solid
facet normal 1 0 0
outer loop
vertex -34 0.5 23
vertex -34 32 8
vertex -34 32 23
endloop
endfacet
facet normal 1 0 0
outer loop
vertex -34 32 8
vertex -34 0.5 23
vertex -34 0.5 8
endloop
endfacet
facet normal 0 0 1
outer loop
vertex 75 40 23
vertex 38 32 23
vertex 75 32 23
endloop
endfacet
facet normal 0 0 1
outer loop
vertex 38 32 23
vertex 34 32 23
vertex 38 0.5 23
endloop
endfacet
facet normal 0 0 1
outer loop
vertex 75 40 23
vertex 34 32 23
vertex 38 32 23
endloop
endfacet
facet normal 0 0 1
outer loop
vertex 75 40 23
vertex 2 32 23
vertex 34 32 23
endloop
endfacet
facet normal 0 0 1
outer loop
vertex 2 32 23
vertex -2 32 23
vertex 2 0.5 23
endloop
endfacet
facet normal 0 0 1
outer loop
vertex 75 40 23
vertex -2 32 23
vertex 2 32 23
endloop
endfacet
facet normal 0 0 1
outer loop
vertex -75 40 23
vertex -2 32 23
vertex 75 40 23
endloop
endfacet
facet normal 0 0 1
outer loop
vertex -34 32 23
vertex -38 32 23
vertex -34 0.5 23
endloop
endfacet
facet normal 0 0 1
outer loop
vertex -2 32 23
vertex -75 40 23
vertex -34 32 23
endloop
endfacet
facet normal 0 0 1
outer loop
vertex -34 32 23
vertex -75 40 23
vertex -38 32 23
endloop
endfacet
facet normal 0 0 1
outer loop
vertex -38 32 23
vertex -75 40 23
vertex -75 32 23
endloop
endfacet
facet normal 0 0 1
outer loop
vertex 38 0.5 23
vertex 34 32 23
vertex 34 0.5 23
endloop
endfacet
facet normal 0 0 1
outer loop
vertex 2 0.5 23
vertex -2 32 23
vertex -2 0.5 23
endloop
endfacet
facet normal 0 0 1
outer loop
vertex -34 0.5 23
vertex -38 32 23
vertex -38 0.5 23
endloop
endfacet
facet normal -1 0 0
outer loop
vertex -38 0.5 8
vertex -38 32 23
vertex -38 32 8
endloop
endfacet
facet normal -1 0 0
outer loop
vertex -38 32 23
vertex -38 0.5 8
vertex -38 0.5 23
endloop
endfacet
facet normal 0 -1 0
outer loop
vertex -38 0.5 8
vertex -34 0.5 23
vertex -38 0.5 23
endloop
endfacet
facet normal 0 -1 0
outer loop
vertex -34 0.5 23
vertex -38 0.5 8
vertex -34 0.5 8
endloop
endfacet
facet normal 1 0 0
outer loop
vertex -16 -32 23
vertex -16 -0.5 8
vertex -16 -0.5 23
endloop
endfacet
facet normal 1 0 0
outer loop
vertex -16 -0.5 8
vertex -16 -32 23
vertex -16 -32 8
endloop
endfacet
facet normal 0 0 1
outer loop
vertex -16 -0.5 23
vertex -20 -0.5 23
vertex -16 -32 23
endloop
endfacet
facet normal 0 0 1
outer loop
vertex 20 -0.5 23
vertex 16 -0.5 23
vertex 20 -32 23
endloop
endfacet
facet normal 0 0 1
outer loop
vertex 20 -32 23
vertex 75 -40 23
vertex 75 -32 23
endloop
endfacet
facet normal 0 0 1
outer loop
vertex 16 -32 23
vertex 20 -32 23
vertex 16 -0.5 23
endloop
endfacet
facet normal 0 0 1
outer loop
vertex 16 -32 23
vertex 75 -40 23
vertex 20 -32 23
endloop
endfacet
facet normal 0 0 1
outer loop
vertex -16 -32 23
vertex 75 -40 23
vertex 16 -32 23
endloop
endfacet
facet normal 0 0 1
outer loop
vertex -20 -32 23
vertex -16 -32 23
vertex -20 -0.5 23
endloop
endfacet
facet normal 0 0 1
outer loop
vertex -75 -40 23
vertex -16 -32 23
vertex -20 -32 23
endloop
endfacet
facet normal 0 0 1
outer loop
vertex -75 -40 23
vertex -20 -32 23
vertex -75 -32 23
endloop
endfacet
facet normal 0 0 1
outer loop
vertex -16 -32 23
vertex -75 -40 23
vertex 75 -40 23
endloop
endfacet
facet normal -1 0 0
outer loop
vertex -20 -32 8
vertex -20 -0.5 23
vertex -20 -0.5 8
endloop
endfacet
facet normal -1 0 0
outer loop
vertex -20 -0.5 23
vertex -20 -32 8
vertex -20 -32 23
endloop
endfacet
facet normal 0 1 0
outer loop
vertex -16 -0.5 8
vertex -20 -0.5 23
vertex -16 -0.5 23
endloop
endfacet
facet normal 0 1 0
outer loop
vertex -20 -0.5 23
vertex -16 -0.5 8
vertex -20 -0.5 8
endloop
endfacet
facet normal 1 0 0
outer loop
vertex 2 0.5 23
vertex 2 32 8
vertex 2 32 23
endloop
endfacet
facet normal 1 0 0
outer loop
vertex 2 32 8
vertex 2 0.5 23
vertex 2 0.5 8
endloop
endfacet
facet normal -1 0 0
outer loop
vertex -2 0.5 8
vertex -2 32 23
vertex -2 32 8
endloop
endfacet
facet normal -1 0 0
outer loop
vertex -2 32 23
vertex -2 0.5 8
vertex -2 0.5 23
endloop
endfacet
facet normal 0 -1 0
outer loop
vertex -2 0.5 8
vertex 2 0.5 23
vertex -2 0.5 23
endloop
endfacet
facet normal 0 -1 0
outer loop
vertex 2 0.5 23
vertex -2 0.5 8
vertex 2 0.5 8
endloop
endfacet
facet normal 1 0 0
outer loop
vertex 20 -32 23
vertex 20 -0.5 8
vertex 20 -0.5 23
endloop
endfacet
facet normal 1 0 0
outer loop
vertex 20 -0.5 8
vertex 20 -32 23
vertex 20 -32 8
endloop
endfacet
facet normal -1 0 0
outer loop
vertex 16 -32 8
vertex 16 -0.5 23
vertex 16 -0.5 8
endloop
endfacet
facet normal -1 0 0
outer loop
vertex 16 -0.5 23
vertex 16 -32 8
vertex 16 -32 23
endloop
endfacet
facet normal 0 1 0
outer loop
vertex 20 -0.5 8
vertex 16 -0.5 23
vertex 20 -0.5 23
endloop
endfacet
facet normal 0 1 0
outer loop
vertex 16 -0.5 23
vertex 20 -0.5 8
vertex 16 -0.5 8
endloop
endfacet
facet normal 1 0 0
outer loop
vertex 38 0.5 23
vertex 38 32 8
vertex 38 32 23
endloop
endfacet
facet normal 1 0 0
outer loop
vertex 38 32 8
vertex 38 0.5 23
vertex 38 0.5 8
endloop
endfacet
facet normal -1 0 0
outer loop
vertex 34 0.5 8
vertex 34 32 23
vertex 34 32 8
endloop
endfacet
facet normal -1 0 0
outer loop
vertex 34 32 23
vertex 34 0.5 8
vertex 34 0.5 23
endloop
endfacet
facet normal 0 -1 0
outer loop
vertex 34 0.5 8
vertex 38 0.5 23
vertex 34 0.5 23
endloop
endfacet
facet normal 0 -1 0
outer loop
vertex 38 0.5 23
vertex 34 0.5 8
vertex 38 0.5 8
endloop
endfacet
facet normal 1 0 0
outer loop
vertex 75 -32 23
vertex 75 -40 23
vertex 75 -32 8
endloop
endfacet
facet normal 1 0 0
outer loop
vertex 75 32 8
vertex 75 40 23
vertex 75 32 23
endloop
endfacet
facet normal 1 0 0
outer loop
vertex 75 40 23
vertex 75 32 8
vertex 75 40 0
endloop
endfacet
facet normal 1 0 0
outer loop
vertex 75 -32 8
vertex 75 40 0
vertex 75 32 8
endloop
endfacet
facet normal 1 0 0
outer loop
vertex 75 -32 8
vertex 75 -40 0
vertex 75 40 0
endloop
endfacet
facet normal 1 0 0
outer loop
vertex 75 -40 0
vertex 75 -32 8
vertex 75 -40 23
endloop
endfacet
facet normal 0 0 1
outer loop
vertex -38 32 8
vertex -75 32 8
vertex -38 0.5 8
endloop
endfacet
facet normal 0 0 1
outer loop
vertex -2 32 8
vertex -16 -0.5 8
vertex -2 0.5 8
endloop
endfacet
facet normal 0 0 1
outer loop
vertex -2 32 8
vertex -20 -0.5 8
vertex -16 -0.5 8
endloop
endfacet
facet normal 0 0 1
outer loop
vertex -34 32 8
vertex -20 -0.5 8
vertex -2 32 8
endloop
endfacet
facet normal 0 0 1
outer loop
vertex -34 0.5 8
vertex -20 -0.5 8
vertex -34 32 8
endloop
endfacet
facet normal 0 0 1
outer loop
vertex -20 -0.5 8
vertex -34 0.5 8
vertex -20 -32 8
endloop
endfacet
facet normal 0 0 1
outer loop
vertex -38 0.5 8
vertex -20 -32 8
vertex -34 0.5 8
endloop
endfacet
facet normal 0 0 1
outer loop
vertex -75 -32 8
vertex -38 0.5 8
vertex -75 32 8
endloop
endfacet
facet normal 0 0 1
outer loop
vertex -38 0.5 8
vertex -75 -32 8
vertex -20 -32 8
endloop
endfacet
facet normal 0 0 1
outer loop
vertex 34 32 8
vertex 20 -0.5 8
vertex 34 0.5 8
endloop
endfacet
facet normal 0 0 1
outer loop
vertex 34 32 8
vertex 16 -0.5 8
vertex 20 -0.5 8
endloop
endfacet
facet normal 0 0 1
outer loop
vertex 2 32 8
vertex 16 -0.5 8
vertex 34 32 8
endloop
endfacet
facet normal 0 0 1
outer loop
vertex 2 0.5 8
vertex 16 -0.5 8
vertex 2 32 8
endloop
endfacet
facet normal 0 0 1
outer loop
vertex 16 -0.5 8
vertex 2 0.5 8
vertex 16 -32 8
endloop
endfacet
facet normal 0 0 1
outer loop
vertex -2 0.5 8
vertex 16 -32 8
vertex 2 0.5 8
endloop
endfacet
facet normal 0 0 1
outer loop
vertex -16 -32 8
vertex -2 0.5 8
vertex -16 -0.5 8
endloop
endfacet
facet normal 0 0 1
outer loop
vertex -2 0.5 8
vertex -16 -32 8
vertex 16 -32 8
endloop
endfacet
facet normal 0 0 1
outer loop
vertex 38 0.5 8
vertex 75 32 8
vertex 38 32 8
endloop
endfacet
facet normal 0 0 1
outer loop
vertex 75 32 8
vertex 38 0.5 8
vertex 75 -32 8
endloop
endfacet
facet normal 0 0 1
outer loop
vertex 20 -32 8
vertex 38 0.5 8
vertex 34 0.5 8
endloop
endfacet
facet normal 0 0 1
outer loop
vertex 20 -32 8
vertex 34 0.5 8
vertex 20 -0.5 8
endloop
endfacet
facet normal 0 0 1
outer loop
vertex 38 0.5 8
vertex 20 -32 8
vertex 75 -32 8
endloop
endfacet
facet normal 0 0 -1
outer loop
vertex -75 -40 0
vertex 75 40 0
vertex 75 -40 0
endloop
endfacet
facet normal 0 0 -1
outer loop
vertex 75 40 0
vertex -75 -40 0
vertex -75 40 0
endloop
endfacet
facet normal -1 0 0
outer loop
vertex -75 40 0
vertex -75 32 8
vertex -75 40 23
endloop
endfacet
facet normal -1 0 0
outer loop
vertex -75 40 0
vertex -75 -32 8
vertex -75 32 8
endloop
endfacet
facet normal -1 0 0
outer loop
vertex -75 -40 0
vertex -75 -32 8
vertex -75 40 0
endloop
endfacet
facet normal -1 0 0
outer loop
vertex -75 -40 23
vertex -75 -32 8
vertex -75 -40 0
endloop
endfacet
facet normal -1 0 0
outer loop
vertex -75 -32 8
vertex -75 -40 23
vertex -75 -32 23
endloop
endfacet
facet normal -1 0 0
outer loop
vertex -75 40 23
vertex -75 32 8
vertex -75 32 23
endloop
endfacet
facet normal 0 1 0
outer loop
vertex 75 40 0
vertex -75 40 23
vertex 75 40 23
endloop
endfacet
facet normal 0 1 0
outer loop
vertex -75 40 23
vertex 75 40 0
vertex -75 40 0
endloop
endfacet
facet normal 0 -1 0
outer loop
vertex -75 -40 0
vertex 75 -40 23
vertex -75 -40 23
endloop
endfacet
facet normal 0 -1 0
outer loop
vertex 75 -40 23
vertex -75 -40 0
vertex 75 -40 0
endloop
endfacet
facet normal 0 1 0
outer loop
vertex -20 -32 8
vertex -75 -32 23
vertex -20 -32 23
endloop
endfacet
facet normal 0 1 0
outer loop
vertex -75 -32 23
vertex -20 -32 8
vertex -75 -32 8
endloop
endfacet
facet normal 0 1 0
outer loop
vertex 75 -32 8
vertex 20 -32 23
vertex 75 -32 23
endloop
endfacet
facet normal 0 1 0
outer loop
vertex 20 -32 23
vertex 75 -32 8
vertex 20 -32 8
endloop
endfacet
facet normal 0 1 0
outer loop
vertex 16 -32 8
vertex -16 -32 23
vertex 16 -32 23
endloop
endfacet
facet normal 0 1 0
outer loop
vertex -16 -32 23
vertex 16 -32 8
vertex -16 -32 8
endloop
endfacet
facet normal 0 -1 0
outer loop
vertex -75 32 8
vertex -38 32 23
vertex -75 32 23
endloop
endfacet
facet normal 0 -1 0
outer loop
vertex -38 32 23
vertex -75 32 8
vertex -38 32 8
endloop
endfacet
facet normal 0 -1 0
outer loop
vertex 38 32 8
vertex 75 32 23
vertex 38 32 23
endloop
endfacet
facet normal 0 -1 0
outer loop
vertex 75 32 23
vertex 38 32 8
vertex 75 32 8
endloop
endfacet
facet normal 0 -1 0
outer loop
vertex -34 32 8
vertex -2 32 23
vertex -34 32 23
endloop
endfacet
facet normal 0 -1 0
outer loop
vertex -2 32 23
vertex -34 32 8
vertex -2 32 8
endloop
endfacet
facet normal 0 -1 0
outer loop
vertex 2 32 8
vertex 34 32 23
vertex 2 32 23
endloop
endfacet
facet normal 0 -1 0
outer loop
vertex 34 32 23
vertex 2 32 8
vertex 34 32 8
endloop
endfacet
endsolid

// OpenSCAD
$fn = 32;

// ----------------------------------------------------------------------
// Rib frame 150 x 80 x 23
// 5 ribs at 18 mm pitch, staggered
// ----------------------------------------------------------------------

// --- parameters (mm) ---
frame = [150, 80, 8];  // base plate size (x, y, z)
rail_w = 8;            // side rail width
ribs = 5;              // number of ribs
rib_t = 4;             // rib thickness
rib_h = 15;            // rib height above the base plate
pitch = 18;            // pitch between rib centres

// --- derived feature positions (mm) ---
span = (ribs - 1) * pitch;          // = 72   distance between the outer ribs
origin_x = -span / 2;               // = -36   X of the first rib
rib_len = frame[1] / 2 - rail_w + 0.5;  // = 32.5   length of a staggered rib
rib_y = 0.5 + rib_len / 2;          // = 16.75   Y of a staggered rib centre
row_offset = 2 * rib_y;             // = 33.5   distance between the two rows
feature_centers = [
  [origin_x + 0 * pitch, rib_y],
  [origin_x + 1 * pitch, -rib_y],
  [origin_x + 2 * pitch, rib_y],
  [origin_x + 3 * pitch, -rib_y],
  [origin_x + 4 * pitch, rib_y]
];   // rib centre line, drives the rib loop

// base plate, two side rails, then the ribs read straight off feature_centers
union() {
  translate([-frame[0] / 2, -frame[1] / 2, 0]) cube(frame);
  translate([-frame[0] / 2, -frame[1] / 2, 0]) cube([frame[0], rail_w, frame[2] + rib_h]);
  translate([-frame[0] / 2, frame[1] / 2 - rail_w, 0]) cube([frame[0], rail_w, frame[2] + rib_h]);
  for (centre = feature_centers)
    translate([centre[0] - rib_t / 2, centre[1] - rib_len / 2, frame[2] - 1])
      cube([rib_t, rib_len, rib_h + 1]);
}
